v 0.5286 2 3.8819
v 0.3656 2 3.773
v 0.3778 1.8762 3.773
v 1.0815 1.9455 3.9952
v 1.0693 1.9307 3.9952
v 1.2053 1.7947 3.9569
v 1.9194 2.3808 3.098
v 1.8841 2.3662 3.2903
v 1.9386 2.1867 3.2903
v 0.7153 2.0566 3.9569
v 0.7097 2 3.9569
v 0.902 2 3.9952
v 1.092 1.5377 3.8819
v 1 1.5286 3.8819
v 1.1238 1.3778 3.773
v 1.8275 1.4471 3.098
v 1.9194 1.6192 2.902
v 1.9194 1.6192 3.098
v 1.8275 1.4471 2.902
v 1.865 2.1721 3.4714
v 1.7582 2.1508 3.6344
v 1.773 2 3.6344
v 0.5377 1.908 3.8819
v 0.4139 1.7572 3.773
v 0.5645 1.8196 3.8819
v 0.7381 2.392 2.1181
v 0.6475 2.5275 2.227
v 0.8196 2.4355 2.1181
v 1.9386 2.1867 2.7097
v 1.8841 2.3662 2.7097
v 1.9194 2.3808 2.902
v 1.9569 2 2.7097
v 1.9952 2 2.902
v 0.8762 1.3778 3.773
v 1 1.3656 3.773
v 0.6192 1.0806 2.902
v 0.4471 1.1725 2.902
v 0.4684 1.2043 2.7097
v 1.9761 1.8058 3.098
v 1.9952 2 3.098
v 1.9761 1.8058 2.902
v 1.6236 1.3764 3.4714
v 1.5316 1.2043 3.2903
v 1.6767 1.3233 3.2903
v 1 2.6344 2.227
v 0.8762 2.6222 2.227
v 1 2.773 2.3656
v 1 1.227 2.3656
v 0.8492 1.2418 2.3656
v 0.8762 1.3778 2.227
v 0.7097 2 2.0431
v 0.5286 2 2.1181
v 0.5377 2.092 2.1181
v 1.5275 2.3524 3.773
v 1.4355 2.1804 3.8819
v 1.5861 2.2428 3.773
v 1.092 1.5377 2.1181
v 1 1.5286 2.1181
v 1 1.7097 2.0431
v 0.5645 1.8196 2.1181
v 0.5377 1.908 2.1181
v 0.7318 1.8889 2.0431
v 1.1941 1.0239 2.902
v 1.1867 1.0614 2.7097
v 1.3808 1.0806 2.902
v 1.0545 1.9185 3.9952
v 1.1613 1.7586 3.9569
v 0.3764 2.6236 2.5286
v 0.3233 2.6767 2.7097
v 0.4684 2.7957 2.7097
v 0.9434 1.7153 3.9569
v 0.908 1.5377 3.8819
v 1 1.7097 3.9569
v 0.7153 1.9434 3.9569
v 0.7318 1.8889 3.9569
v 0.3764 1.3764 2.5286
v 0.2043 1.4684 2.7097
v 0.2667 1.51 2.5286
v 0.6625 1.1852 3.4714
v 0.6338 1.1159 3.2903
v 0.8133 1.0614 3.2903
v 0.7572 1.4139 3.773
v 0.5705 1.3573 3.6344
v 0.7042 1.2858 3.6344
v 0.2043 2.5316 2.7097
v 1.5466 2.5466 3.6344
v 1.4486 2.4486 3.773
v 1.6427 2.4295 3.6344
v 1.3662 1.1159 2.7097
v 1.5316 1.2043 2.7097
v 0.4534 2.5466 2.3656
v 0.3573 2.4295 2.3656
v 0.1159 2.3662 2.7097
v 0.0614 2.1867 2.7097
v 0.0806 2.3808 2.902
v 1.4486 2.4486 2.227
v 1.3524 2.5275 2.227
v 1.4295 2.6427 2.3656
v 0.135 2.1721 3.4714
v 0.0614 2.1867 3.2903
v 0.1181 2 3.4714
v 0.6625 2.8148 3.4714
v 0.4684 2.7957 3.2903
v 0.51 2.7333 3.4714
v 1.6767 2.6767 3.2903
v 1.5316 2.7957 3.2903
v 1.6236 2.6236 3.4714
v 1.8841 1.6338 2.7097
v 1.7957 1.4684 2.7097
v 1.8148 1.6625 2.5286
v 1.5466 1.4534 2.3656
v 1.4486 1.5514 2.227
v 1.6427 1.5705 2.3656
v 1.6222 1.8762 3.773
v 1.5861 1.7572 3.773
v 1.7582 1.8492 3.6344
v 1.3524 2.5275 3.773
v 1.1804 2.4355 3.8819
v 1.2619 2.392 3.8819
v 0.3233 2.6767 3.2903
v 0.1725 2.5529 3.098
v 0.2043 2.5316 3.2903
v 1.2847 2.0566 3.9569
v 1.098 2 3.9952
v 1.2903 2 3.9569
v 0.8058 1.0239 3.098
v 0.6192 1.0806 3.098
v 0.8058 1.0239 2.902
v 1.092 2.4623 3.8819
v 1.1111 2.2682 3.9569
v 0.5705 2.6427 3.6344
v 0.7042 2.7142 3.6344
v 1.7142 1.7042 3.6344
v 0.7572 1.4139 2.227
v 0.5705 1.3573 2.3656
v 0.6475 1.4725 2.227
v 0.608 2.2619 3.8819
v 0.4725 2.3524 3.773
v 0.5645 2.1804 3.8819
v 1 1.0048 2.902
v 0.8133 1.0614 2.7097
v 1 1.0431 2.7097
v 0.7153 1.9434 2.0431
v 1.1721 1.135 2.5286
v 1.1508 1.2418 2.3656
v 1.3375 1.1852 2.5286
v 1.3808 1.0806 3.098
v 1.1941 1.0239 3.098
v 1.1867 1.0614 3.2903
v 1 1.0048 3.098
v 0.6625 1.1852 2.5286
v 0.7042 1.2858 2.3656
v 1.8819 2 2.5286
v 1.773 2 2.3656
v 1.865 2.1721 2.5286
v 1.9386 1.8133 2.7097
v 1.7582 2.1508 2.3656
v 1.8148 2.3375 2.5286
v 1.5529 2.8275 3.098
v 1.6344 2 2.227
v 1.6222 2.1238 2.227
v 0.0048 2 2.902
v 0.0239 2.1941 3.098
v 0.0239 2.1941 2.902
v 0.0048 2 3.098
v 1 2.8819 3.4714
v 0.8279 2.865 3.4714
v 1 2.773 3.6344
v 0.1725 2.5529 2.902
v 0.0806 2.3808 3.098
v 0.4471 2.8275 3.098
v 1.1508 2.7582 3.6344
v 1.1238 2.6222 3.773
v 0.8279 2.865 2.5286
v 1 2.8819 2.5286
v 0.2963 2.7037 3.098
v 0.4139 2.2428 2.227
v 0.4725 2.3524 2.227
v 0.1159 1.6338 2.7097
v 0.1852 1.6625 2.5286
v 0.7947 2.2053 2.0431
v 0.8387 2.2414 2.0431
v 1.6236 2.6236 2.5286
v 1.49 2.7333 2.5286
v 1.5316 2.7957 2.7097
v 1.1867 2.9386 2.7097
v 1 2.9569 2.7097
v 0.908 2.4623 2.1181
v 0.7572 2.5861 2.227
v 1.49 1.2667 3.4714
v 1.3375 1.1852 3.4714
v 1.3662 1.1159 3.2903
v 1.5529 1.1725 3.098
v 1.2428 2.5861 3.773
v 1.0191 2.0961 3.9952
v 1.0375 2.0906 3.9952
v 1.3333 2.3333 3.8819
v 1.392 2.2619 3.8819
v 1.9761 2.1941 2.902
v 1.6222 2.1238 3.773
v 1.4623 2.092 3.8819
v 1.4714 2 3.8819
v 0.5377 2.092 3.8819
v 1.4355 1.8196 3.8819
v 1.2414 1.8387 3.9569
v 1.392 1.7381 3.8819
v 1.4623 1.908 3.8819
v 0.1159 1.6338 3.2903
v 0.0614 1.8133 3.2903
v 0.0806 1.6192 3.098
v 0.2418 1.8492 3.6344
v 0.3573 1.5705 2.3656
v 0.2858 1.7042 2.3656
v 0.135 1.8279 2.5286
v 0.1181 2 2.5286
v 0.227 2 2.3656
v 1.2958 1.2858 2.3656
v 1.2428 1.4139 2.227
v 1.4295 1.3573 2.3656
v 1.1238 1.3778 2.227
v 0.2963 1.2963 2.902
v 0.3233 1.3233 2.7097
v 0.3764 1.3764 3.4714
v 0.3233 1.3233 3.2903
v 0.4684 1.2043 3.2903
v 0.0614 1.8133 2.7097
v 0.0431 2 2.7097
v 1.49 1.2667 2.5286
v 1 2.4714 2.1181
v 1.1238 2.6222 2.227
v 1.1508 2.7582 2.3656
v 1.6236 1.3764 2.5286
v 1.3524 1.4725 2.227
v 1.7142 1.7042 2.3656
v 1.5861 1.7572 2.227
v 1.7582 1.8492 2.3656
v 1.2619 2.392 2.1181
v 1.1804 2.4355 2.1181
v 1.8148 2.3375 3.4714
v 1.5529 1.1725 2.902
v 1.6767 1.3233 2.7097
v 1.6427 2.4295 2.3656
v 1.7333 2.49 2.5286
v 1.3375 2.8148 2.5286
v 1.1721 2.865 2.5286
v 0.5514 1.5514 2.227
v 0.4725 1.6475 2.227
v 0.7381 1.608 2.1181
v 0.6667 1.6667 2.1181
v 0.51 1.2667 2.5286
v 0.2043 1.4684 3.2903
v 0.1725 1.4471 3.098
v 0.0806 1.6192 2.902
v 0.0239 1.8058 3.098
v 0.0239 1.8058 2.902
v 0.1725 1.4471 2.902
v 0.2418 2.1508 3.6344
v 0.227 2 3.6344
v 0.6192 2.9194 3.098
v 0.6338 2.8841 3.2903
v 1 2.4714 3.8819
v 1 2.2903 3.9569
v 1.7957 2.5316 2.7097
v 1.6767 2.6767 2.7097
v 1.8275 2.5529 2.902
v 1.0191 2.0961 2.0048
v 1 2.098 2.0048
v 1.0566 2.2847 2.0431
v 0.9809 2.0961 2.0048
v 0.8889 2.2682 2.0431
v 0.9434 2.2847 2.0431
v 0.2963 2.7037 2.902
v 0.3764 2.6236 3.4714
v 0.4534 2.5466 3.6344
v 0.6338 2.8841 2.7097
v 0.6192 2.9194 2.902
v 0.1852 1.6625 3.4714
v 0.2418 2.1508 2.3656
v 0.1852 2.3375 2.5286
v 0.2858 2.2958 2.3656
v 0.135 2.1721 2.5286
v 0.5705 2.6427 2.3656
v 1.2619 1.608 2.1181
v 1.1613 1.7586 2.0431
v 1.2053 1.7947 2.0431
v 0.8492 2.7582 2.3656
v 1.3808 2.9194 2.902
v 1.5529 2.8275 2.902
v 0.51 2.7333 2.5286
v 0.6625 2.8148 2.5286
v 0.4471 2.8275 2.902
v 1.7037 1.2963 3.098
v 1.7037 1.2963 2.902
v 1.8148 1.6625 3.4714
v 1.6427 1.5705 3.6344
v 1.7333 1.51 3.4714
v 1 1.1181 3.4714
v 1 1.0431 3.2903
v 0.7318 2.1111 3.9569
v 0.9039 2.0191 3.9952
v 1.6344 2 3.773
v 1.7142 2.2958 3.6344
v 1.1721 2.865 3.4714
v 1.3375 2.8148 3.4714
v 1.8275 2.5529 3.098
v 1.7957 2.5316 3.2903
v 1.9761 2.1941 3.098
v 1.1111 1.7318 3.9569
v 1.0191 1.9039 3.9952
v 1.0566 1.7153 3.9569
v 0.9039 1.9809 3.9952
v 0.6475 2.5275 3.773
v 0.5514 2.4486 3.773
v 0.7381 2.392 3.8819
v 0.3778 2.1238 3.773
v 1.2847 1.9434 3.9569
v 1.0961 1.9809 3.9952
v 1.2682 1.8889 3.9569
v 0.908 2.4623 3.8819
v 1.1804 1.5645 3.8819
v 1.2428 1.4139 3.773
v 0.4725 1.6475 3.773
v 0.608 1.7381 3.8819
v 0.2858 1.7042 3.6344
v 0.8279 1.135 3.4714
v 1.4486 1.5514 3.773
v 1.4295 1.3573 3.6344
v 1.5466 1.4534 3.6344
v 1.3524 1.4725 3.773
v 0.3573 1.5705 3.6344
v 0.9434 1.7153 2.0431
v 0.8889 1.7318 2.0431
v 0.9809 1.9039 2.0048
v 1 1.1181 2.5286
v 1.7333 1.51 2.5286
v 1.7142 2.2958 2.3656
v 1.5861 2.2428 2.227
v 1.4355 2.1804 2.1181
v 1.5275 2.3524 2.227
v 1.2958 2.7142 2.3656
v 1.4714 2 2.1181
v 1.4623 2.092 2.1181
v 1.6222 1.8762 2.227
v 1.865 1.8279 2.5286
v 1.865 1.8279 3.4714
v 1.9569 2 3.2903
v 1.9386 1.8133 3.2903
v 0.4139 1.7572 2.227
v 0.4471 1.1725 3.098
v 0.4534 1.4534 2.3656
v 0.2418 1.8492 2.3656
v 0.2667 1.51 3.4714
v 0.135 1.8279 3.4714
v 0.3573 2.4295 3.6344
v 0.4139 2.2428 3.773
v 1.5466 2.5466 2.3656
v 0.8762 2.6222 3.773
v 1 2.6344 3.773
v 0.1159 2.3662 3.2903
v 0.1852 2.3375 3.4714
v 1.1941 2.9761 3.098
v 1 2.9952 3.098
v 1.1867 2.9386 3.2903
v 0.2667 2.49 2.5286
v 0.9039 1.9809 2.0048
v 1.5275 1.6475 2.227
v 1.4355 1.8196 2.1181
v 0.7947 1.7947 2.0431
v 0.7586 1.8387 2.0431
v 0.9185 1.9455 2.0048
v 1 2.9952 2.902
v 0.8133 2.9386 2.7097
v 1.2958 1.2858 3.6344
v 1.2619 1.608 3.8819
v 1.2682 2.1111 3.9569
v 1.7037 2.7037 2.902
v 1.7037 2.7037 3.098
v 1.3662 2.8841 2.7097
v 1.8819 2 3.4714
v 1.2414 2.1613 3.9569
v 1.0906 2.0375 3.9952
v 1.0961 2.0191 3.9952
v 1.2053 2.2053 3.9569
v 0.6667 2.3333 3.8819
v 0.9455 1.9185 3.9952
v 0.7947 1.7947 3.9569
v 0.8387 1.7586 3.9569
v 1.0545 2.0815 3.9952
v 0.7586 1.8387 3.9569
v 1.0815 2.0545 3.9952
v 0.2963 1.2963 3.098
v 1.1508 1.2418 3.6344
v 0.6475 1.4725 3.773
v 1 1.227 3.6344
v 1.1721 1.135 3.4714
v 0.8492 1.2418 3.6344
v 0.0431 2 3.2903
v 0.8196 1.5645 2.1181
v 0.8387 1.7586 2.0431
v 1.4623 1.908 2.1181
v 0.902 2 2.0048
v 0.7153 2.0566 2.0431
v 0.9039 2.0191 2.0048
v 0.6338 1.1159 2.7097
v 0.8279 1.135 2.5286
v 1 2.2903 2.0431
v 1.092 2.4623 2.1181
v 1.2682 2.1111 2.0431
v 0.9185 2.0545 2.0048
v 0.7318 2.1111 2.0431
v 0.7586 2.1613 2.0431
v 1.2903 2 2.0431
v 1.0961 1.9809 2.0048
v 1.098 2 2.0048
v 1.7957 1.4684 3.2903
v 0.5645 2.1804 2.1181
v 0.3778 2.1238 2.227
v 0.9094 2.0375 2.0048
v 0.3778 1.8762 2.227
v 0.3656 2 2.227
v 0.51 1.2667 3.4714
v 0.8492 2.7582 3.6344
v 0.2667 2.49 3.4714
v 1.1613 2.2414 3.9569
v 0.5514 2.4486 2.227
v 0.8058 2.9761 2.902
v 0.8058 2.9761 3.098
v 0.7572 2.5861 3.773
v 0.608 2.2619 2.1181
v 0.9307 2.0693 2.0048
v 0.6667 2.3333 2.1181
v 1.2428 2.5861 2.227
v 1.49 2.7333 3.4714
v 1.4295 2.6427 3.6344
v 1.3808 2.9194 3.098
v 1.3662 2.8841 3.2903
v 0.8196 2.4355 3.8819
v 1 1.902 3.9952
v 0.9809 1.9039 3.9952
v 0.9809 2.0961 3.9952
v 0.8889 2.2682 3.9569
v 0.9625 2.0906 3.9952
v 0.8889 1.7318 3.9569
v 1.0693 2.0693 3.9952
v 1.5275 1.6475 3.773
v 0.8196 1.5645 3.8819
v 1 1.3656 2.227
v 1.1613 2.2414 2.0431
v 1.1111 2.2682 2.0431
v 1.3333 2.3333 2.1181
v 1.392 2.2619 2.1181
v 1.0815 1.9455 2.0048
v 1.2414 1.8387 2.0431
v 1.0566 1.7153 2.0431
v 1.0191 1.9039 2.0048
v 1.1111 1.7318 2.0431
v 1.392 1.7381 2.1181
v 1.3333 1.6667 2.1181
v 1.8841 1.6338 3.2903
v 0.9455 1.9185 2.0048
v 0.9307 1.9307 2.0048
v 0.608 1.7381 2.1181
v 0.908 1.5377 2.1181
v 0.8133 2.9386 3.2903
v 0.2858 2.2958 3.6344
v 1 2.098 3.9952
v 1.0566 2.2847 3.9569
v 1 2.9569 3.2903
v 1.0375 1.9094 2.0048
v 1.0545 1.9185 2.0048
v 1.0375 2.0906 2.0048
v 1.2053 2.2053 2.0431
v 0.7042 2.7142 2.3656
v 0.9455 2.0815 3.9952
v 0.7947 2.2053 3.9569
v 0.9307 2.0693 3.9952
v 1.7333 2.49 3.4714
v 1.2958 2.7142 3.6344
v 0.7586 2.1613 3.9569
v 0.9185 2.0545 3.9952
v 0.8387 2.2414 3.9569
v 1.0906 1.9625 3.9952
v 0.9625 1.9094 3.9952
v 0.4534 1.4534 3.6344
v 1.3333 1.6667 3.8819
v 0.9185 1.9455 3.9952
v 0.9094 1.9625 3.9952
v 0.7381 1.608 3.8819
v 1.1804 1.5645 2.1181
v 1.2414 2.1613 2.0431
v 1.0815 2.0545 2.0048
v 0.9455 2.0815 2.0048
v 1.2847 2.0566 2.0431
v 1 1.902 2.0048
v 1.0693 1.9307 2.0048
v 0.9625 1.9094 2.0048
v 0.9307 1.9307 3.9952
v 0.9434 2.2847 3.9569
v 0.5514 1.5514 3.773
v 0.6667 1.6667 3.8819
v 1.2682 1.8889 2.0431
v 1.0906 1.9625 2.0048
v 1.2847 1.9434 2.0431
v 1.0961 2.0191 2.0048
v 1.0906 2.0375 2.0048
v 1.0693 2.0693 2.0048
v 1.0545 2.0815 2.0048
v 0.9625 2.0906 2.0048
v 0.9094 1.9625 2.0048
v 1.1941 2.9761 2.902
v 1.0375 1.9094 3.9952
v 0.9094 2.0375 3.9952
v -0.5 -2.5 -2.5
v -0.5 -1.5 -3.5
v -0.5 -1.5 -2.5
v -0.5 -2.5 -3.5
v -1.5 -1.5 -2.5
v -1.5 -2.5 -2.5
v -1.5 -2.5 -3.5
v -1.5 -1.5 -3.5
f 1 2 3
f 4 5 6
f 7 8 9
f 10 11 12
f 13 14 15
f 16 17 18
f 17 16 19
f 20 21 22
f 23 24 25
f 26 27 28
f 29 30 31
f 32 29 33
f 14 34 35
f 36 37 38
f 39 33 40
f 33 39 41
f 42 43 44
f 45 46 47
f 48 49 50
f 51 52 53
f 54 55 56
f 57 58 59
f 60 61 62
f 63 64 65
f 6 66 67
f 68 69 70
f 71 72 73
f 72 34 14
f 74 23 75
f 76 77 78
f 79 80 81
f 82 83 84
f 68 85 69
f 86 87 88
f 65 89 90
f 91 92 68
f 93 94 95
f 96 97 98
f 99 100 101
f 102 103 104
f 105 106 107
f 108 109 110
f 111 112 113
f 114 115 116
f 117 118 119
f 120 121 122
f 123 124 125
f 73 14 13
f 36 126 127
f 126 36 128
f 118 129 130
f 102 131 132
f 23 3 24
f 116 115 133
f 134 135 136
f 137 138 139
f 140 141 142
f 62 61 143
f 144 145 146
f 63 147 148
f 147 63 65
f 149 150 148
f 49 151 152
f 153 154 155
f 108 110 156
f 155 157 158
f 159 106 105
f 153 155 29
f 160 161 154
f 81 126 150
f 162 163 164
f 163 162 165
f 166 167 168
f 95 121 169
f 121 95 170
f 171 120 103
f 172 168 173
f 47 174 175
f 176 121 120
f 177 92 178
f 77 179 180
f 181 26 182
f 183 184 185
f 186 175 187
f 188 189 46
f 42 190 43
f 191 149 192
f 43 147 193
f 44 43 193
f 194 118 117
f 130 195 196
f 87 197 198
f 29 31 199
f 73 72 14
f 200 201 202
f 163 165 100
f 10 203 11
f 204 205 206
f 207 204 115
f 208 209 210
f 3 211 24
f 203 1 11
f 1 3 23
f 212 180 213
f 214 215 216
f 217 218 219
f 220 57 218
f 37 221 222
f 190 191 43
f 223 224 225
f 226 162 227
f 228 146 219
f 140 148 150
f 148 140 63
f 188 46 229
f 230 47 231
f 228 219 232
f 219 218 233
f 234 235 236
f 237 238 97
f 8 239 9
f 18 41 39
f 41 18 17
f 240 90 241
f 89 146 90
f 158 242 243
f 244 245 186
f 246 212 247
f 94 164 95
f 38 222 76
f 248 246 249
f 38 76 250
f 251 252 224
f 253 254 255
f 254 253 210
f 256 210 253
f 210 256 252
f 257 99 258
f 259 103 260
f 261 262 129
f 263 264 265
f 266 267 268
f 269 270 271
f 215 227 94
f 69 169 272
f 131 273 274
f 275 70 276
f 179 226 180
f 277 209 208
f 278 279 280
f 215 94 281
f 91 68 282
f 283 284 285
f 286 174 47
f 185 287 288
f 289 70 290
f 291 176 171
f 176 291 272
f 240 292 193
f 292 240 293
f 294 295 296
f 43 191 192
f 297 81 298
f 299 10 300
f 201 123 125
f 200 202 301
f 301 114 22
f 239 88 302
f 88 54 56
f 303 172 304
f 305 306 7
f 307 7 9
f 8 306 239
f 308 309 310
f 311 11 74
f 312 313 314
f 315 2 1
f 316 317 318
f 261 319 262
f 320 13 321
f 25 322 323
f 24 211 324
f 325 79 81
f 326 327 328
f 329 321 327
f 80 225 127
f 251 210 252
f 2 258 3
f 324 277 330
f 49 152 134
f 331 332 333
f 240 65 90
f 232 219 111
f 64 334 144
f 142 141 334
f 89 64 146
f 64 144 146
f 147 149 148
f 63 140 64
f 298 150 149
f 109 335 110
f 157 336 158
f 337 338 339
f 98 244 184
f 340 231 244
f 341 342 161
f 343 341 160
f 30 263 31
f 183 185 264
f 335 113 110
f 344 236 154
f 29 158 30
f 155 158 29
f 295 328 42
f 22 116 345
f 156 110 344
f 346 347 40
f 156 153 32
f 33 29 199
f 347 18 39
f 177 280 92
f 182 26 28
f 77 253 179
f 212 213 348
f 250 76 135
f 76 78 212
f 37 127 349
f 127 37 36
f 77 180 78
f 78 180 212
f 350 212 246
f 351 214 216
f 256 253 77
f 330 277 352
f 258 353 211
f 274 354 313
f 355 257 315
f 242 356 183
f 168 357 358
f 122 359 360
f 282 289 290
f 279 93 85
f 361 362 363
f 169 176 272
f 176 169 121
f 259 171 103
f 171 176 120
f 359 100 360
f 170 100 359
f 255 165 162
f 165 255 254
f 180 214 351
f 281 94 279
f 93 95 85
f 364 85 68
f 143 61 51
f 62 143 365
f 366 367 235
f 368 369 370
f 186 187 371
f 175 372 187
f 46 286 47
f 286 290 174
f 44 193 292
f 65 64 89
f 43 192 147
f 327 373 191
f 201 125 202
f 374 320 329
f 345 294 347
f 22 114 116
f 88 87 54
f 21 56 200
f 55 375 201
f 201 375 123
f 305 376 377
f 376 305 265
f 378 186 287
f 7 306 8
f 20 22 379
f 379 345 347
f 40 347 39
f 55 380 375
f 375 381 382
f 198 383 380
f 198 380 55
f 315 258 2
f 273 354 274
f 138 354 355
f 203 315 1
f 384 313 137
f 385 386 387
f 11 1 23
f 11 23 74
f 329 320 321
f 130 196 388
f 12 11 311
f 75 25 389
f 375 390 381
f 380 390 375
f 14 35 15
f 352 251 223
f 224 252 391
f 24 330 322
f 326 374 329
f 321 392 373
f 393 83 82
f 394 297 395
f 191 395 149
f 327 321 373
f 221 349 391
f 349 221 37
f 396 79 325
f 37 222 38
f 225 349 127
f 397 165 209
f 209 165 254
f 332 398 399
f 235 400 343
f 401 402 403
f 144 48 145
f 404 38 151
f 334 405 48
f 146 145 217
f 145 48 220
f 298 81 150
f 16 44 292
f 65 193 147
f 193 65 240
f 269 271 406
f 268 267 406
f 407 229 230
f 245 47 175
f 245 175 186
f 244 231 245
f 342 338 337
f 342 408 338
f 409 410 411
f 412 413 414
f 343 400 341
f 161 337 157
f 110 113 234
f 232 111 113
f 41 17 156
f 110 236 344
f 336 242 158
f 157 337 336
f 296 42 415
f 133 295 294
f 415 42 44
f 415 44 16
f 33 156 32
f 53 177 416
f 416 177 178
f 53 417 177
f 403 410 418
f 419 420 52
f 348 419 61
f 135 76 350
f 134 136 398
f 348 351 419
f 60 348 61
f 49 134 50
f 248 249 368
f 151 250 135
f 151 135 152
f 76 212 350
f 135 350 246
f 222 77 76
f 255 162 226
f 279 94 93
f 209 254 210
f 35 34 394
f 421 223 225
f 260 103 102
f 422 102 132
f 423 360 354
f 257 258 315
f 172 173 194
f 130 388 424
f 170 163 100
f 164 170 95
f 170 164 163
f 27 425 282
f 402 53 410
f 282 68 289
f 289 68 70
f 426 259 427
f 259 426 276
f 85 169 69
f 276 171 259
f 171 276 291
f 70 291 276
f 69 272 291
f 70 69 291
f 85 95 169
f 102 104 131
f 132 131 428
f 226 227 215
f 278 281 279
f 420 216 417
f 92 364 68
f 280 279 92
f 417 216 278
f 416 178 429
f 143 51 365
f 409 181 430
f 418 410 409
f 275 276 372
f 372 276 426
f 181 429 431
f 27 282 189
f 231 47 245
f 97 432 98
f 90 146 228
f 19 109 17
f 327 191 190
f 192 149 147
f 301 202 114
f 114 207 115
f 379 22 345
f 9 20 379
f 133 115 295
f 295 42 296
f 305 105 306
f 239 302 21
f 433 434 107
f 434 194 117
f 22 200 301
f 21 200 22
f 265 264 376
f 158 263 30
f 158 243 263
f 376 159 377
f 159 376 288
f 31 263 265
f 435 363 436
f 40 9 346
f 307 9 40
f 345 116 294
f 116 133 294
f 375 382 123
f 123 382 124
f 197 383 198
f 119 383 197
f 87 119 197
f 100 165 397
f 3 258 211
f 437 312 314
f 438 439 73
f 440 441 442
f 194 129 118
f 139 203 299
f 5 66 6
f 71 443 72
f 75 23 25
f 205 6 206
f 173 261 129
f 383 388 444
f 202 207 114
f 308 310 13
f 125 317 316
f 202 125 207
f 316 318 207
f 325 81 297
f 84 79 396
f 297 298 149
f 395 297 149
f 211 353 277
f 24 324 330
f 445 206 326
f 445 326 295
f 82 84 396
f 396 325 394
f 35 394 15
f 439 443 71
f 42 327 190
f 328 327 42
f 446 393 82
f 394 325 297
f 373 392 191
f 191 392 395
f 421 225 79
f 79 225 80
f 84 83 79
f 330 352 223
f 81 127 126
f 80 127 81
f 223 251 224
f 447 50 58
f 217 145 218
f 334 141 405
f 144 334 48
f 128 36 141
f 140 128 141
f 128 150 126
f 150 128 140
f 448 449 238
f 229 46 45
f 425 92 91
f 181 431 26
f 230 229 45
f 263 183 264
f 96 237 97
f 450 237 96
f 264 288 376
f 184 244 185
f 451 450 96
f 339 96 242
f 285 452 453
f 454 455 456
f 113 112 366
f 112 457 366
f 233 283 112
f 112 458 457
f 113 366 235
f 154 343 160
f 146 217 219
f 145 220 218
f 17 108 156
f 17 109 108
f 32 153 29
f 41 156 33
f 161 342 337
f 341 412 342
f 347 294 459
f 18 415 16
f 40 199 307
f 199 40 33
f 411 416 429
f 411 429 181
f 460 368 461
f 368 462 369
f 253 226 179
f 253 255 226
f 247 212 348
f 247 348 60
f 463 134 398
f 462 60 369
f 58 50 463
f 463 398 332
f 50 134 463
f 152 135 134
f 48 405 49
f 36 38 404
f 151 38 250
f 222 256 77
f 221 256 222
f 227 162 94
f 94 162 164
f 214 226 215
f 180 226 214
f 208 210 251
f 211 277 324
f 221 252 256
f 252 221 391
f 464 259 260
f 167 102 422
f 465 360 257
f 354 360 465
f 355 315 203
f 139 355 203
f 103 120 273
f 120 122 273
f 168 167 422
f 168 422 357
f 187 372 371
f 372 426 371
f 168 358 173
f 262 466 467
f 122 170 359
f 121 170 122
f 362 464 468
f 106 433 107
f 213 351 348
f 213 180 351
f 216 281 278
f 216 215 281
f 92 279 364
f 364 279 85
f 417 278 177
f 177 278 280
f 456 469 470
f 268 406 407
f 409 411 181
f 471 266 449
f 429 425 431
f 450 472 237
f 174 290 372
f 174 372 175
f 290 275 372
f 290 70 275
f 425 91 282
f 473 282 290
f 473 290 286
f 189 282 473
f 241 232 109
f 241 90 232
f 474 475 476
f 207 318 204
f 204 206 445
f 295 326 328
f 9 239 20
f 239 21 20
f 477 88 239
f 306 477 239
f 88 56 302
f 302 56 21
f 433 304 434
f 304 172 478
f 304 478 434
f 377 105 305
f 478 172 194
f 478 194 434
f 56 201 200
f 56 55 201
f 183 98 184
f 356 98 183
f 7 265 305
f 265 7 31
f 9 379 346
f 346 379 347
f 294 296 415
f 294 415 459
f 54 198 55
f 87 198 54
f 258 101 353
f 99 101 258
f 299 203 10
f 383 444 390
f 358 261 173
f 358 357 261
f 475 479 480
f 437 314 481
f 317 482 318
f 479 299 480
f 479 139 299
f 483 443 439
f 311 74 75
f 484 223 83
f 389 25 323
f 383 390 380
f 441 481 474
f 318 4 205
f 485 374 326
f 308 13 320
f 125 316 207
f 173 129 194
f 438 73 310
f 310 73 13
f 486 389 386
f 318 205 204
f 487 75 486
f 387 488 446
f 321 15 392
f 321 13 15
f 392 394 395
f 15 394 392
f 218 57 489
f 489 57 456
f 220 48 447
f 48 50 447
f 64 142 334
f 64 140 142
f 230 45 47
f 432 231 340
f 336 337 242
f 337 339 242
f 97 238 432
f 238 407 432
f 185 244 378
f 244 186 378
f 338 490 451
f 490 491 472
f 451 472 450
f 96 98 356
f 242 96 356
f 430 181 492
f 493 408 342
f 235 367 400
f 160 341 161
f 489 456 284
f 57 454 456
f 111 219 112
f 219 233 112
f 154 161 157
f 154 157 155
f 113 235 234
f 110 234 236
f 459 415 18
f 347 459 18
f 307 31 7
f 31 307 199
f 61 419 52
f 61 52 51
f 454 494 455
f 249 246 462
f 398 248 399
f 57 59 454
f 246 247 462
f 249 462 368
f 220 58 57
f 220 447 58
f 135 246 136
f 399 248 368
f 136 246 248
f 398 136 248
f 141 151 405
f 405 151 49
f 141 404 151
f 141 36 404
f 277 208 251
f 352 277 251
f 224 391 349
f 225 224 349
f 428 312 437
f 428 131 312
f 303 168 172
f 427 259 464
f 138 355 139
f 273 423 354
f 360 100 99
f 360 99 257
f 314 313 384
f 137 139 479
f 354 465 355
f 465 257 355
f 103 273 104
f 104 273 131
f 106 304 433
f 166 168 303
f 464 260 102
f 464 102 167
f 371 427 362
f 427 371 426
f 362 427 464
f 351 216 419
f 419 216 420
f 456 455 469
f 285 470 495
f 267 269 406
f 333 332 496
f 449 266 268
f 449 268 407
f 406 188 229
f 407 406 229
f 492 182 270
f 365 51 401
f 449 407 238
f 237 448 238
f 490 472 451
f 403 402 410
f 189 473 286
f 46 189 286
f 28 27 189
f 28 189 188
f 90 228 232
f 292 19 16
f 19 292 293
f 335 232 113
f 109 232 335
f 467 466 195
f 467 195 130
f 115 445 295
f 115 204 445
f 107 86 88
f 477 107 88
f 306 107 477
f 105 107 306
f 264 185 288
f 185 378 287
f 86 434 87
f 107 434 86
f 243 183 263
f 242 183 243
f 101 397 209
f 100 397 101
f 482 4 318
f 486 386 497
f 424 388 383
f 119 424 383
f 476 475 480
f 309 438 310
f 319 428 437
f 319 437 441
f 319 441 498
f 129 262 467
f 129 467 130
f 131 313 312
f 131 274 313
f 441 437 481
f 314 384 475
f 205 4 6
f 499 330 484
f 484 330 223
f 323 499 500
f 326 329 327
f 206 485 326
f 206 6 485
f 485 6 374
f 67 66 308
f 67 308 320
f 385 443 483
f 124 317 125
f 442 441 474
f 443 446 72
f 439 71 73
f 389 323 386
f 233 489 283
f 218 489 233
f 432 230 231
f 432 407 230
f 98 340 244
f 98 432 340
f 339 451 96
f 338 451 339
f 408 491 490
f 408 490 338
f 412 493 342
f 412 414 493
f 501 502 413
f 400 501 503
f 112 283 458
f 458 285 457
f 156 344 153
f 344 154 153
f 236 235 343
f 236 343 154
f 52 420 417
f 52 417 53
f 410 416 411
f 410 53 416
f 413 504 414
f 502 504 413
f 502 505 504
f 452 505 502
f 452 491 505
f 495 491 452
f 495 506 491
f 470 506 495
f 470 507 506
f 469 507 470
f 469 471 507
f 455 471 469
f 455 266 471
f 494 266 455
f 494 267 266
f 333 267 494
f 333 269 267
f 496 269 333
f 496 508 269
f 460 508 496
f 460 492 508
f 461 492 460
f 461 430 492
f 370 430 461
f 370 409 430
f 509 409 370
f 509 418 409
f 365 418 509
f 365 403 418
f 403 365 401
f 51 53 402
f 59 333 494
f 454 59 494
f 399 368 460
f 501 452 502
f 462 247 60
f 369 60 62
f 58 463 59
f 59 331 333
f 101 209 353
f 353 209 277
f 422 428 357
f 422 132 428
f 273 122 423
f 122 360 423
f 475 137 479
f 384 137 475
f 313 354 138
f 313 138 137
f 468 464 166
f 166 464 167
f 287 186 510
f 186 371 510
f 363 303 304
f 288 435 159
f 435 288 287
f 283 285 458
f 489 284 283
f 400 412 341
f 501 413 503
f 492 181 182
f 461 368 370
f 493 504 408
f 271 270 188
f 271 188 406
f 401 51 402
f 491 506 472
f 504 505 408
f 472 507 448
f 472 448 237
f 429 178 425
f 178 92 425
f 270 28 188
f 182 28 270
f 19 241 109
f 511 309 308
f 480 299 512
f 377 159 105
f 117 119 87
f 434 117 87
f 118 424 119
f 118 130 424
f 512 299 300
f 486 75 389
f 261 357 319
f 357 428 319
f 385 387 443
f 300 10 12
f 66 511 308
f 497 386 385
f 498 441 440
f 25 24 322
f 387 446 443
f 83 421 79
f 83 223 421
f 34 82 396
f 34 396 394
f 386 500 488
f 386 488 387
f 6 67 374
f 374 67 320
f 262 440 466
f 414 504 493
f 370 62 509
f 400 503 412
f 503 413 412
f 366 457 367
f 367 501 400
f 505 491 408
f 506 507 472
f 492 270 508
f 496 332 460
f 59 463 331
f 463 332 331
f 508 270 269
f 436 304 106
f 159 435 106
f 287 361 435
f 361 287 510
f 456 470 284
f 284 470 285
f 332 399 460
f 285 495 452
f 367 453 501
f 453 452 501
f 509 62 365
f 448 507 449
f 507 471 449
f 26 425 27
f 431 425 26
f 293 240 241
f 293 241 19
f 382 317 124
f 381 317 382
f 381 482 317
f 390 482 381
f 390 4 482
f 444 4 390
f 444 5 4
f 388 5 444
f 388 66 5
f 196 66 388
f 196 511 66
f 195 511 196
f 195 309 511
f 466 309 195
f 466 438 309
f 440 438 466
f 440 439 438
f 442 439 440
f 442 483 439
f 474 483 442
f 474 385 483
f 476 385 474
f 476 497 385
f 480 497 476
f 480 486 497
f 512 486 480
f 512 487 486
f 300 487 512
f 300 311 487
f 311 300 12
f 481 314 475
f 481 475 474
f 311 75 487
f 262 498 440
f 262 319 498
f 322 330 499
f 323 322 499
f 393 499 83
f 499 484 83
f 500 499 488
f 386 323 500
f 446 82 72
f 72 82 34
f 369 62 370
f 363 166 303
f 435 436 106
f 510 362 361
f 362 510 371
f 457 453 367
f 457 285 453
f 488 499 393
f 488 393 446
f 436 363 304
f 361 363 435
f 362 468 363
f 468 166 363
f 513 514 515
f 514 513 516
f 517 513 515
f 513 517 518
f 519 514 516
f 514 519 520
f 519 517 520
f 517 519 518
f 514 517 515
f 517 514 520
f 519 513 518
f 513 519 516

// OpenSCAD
// file: ../scon.scad
function scon_value(scon,path,missing = function(path) undef,dist = 0) =
  is_undef(path) ? missing :
  (len(path) <= dist || is_undef(scon)) ?
    (is_undef(scon) ? missing(path) : scon) :
    let (
      key = path[dist],
      next = is_undef(key) ?
        scon :
	is_string(key) ?
          _scon_map(scon, key, path) :
          _scon_index(scon, key, path)
    ) scon_value(next, path, missing, dist + 1);

// Make a property-extractor function from an SCON value.
// Basic usage:
//
//   cfg_scon = [["x",1],["y",true]];
//   cfg = scon_make([["x",1],["y",true]]);
//   x=cfg(["x"]);
//   y=cfg(["y"]);
//   z=cfg(["z"], 3); // z = 3 because it is not in cfg_scon.
//
// Advanced Meta-programming note:
//   - cfg([])   ⇒ returns the full SCON data structure.
//   - cfg(undef)⇒ returns the configured missing-fallback function.
// This allows for introspection of the data used to make cfg function.
//
function scon_make(scon,base=undef)=
  is_undef(base) ?
    function(path,missing=undef)
      scon_value(scon,path,function (missing_path) missing)
  :
    function(path,missing=undef)
      scon_value(scon,path,function (missing_path) base(missing_path,missing));

//
// Convert a scon value to a json string
//
// Ex: scon_to_json(true) == "true"
//     scon_to_json(17) == "17"
//     scon_to_json("length") == "\"length\""
//     scon_to_json([["x",1],["y",2]]) == "{\"x\":1,\"y\":2}"
//     scon_to_json([2,3,5,8]) == "[2,3,5,8]"
//
//  List/object ambiguity! Since OpenSCAD has no native map, there must be an
//  ambiguity in the conversion to the distinct [item[0],item[1],...] list
//  and the {"name0":value0,"name1":value1,..} object notation in JSON.
//
//  The rule Scon uses is:
//
//    If every element of a Vector is a [string,value] pair, then it is converted
//    to an object.  Otherwise it is a list.
//
//    So [], [["x",1],["y",2]], are maps and become "{}" and "{\"x\":1,\"y\":2}"
//    any other Vector is converted to a list.
//
function scon_to_json(scon) =
  is_undef(scon) ? "null" :
  is_bool(scon) ? str(scon) :
  is_num(scon) ? str(scon) :
  is_string(scon) ? _scon_json_str(scon) :
  _scon_is_map(scon) ? _scon_json_map(scon) :
  is_list(scon) ? _scon_json_list(scon) :
  _scon_json_str("??? ",scon," ???");

//
// Development builds of OpenSCAD with the import-function feature enabled
// can import Json directly.  To convert this import to SCON, you can use this
// function.
//
// The json2scon.js and json2scon.py scripts create a back-portable way to
// do this by externally converting to 
// 
// Developer Build usage:
//
//   cfg = scon_make(json_to_scon(import("config.json")));
//
// Portable usage:
//
//   # from terminal or build script
//   python3 json2scon.py <config.json >config.scon
//   # or
//   node json2scon.js <config.json >config.scon
//   # or (quickjs)
//   qjs --std -m json2scon.js <config.json >config.scon
//
//   # in OpenSCAD
//   cfg = scon_make(include "config.scon");
//
function scon_from_json(json) =
  is_object(json)
    ? [ for (k = json) [ k, scon_from_json(json[k]) ] ]
  : is_list(json)
    ? [ for (i = [0:len(json)-1]) scon_from_json(json[i]) ]
  : json;

function _scon_map(scon_map, key, path) =
    let (result = search([key], scon_map,0)[0])
      len(result) > 0 ? scon_map[result[len(result)-1]][1] : undef;

function _scon_index(scon_list, index, path) =
    (is_list(scon_list) && 0 <= index && index < len(scon_list)) ? scon_list[index] : undef;

function _scon_is_mapping(scon) =
    is_list(scon) && len(scon) == 2 && is_string(scon[0]);

function _scon_all_seq(seq,begin,end) =
  begin >= end ? true : seq(begin) && _scon_all_seq(seq,begin+1,end);

function _scon_is_map(scon) =
    is_list(scon) &&
    _scon_all_seq(function(i) _scon_is_mapping(scon[i]),0,len(scon));


function _scon_str_seq(seq,begin,end) = // str(seq(begin),...,seq(end-1))
  let (n = (begin < end) ? end - begin : 0,
       m = ((n % 2) == 0) ? n/2 : (n-1) / 2)
  n > 1 ? str(_scon_str_seq(seq,begin,begin+m),_scon_str_seq(seq,begin+m,end)) :
  n == 1 ? str(seq(begin)) : "";

function _scon_str_list(list,begin=0,_end=undef) =
  let (seq = function (i) list[i],end = is_undef(_end) ? len(list) : _end)
  _scon_str_seq(seq,begin,end);

// sep can also be a lambda function of the index
function _scon_str_join_seq(seq,begin,end,sep=",") =
  let (n = (begin < end) ? end - begin : 0,
       m = ((n % 2) == 0) ? n/2 : (n-1) / 2)
  n > 1 ? str(_scon_str_join_seq(seq,begin,begin+m,sep),is_function(sep) ? sep(begin+m-1) : sep,_scon_str_join_seq(seq,begin+m,end,sep)) :
  n == 1 ? str(seq(begin)) : "";

function _scon_str_join_list(list,begin=0,_end=undef,sep=",") =
  let (seq = function (i) list[i],end = is_undef(_end) ? len(list) : _end)
  _scon_str_join_seq(seq,begin,end,sep);
  
function _scon_json_chr(c) =
  (c == "\"") ? "\\\"" :
  (c == "\\") ? "\\\\" :
  (c == "/") ? "\\/" :
  (c == "\x08") ? "\\b" :
  (c == "\x0c") ? "\\f" :
  (c == "\n") ? "\\n" :
  (c == "\r") ? "\\r" :
  (c == "\x09") ? "\\t" :
  c;  

function _scon_json_str(scon) =
  let (seq=function (i) _scon_json_chr(scon[i]))
  str("\"",_scon_str_seq(seq,0,len(scon)),"\"");

function _scon_json_map(scon) =
  let(seq=function(i) str(_scon_json_str(scon[i][0]),":",scon_to_json(scon[i][1])))
  str("{",_scon_str_join_seq(seq,0,len(scon)),"}");

function _scon_json_list(scon) =
  let(seq=function(i) scon_to_json(scon[i]))
  str("[",_scon_str_join_seq(seq,0,len(scon)),"]");
// main file
include <../scon.scad>

sphere_scon = [
  ["radius",1],
  ["center",[1,2,3]],
  ["color",[1,1,0]],
  ["fn",32]
];

cube_scon = [
  ["size",1],
  ["center",[-1,-2,-3]],
  ["color",[0,0,1]],
];

cfg_scon = [
  ["sphere", sphere_scon],
  ["cube", cube_scon]
];

// makes a convenient accessor function
cfg = scon_make(cfg_scon);

sphere_radius=cfg(["sphere","radius"],1);
sphere_center=cfg(["sphere","center"],[0,0,0]);
sphere_color=cfg(["sphere","color"],[1,1,0]);
sphere_fn=cfg(["sphere","fn"],32);
color(sphere_color) translate(sphere_center) sphere(r=sphere_radius,$fn=sphere_fn);

cube_size=cfg(["cube","size"],[1,1,1]);
cube_center=cfg(["cube","center"],[0,0,0]);
cube_color=cfg(["cube","color"],[1,1,0]);
color(cube_color) translate(cube_center) cube(size=cube_size,center=true);
